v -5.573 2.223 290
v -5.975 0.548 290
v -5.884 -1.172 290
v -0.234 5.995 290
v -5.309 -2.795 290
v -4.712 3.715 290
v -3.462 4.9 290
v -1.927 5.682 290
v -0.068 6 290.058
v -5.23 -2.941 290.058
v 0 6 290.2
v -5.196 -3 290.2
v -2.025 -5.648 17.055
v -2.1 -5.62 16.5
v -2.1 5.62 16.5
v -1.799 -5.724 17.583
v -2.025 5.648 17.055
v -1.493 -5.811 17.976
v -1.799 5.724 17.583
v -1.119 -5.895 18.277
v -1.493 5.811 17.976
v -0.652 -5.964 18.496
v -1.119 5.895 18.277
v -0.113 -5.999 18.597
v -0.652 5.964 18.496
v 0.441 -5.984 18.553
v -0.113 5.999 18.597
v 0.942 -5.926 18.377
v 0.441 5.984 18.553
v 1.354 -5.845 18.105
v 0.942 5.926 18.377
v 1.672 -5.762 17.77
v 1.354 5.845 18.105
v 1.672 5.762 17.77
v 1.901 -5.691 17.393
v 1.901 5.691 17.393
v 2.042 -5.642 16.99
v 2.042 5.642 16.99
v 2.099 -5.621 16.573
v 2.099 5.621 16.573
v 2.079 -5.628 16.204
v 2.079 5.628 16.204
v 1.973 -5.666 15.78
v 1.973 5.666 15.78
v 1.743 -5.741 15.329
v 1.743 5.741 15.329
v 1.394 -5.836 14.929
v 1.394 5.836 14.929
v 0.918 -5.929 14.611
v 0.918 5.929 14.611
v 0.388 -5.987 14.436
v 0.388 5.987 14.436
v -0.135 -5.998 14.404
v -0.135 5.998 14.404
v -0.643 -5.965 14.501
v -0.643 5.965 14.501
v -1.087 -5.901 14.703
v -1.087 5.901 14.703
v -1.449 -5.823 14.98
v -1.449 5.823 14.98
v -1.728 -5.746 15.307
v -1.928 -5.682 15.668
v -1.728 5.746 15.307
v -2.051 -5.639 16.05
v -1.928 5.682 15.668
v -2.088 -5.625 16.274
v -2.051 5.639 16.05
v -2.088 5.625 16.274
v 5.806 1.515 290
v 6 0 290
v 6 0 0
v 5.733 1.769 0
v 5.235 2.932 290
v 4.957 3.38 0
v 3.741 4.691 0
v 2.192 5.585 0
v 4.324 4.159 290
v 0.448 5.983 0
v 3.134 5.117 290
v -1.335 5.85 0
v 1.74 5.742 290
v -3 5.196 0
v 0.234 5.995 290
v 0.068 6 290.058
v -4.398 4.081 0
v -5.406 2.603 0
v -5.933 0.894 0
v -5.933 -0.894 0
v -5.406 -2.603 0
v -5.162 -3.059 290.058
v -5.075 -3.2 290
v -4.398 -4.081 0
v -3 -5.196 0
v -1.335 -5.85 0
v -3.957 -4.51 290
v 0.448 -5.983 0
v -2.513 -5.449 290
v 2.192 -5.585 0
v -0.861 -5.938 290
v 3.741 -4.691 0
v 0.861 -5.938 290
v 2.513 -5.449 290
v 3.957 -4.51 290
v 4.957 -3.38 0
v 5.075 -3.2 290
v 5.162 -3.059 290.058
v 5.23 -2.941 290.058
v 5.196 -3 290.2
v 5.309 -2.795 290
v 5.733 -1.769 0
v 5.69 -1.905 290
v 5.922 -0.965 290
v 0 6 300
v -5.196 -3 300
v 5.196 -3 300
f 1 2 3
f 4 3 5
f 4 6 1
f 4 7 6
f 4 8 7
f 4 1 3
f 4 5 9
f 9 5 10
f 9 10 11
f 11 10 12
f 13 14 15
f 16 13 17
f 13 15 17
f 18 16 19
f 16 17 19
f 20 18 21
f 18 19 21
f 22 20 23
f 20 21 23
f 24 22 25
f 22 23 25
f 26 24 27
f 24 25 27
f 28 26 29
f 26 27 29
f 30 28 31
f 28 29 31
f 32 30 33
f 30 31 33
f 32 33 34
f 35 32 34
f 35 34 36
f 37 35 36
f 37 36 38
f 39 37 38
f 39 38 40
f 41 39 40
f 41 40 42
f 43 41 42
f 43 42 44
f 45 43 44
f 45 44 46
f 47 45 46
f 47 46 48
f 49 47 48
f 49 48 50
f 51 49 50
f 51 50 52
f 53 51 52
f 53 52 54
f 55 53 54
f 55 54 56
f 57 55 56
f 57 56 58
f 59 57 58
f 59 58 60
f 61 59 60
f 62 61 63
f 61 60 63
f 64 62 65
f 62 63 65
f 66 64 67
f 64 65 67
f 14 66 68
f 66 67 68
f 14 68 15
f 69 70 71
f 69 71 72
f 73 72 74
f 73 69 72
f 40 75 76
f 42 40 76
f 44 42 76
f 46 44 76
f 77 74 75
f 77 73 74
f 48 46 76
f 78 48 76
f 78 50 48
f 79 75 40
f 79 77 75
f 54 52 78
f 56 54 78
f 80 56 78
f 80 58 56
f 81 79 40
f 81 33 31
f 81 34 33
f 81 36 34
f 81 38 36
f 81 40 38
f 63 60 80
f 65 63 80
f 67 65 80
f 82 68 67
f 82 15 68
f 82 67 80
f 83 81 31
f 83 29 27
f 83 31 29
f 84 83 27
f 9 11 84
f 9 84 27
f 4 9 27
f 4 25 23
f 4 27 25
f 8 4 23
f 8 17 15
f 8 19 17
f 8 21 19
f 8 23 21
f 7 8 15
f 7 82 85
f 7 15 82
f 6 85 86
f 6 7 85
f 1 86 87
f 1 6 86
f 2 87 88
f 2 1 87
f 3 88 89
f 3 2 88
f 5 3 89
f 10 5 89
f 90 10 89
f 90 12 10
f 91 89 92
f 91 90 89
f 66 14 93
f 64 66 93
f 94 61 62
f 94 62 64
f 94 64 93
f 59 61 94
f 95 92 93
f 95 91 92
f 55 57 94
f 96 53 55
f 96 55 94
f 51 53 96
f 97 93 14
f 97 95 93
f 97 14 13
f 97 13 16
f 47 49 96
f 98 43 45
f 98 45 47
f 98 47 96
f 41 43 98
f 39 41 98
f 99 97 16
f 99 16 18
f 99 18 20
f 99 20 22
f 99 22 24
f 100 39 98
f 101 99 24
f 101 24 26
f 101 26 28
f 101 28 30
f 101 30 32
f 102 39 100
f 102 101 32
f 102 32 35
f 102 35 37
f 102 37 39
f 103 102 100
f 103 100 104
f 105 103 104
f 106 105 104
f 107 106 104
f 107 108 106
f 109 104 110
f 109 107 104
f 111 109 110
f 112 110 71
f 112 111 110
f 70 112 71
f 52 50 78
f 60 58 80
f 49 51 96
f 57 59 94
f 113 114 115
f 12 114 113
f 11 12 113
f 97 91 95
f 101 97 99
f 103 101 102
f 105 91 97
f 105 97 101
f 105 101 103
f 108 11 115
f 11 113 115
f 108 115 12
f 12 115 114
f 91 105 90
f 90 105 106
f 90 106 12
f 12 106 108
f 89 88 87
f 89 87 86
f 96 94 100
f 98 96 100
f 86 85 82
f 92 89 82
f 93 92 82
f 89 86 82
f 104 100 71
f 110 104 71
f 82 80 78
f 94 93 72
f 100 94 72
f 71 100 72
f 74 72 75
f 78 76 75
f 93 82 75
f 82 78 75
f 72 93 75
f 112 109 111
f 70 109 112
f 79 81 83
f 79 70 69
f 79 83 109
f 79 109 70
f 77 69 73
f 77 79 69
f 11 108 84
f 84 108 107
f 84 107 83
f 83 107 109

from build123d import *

# Parameters (mm, degrees)
F0_R        = 6
F1_DEPTH    = 300
F2_R        = 11
F3_DEPTH    = 10
F4_T4_DEPTH = 11.3923048454
F4_S5_R     = 6
F4_T6_DEPTH = 7
F5_T4_DEPTH = 11.3923048454
F5_S5_R     = 6
F5_T6_DEPTH = 7
F6_R        = 0.2
F9_D        = 4.2


# Not quite as in the source:
# - a fillet or chamfer that OpenCascade refuses, or shapes differently, is made with other operations: its cross-section is extruded or revolved along the edge and cut away or added


with BuildPart() as f1:
    # F0 (on Top) → F1 (new body)
    with BuildSketch(Plane.XY):
        Circle(F0_R)
    extrude(amount=F1_DEPTH)

    # F2 (on face) → F3 (cut)
    with BuildSketch(Plane.XY.offset(300)):
        Circle(F2_R)
        Polygon((5.1961524227, -3), (-5.1961524227, -3), (0, 6), align=None, mode=Mode.SUBTRACT)
    extrude(amount=-F3_DEPTH, mode=Mode.SUBTRACT)

    # F4: fillet of radius 0.2 on 1 edges, made by hand


with BuildPart() as f4_tool2:
    # F4_s3 → F4_t4 (new body)
    with BuildSketch(Plane.YZ.offset(5.6961524227)):
        with BuildLine():
            ThreePointArc((-3.2, 290), (-3.0585786438, 290.0585786438), (-3, 290.2))
            Line((-3, 290.2), (-3, 290))
            Line((-3, 290), (-3.2, 290))
        make_face()
    extrude(amount=-F4_T4_DEPTH)

    # F4_s5 → F4_t6 (intersect, symmetric)
    with BuildSketch(Plane.XY.offset(290.1)):
        Circle(F4_S5_R)
    extrude(amount=F4_T6_DEPTH, both=True, mode=Mode.INTERSECT)

    split(bisect_by=Plane(origin=(2.5980762114, 1.5, 0), x_dir=(0, 0, 1), z_dir=(-0.8660254038, -0.5, 0)), keep=Keep.TOP)

    split(bisect_by=Plane(origin=(-2.5980762114, 1.5, 0), x_dir=(0, 0, 1), z_dir=(0.8660254038, -0.5, 0)), keep=Keep.TOP)


with BuildPart() as f1_1:
    add(f1.part)

    # F4_t1: union F4_tool2
    add(f4_tool2.part)

    # F5: fillet of radius 0.2 on 1 edges, made by hand


with BuildPart() as f5_tool2:
    # F5_s3 → F5_t4 (new body)
    with BuildSketch(Plane(origin=(-2.8480762114, -4.9330127019, 0), x_dir=(0, 0, 1), z_dir=(0.5, 0.8660254038, 0))):
        with BuildLine():
            ThreePointArc((290, -3.2), (290.0585786438, -3.0585786438), (290.2, -3))
            Line((290.2, -3), (290, -3))
            Line((290, -3), (290, -3.2))
        make_face()
    extrude(amount=F5_T4_DEPTH)

    # F5_s5 → F5_t6 (intersect, symmetric)
    with BuildSketch(Plane.XY.offset(290.1)):
        Circle(F5_S5_R)
    extrude(amount=F5_T6_DEPTH, both=True, mode=Mode.INTERSECT)

    split(bisect_by=Plane(origin=(2.5980762114, 1.5, 0), x_dir=(0, 0, 1), z_dir=(-0.8660254038, -0.5, 0)), keep=Keep.TOP)


with BuildPart() as f1_2:
    add(f1_1.part)

    # F5_t1: union F5_tool2
    add(f5_tool2.part)

    # F6
    f6_edges = [f1_2.edges().sort_by_distance(p)[0] for p in [
        (2.598076, 1.5, 290),
    ]]
    fillet(f6_edges, radius=F6_R)

    # F9 (through all)
    with Locations(Plane.XZ.offset(6)):
        with Locations((0, 16.5)):
            Hole(F9_D / 2)


solid = f1_2.part
